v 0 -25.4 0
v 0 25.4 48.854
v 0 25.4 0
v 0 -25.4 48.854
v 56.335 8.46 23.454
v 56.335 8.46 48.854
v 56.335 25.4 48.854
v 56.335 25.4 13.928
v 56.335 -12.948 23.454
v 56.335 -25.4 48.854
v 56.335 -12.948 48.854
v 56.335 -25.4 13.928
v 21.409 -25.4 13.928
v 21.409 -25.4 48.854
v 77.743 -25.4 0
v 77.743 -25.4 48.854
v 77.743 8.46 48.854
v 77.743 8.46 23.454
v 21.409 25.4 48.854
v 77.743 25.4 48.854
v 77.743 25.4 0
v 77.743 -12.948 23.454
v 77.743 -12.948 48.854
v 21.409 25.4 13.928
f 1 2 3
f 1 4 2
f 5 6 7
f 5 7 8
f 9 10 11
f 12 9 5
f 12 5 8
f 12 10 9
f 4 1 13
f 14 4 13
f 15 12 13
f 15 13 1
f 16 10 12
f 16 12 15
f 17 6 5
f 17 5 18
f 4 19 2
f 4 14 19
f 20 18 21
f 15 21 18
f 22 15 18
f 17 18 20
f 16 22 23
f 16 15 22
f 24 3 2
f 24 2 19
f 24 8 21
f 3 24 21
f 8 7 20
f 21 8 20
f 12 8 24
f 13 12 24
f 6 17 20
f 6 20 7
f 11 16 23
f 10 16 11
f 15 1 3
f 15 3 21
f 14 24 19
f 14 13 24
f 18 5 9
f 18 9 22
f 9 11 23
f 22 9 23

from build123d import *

# Parameters (mm, degrees)
F1_DEPTH      = 25.4
F1_DEPTH_BACK = 25.4
F2_W          = 21.4085327461
F2_H          = 21.4085327461
F3_DEPTH      = 25.4


with BuildPart() as f1:
    # F0 (on Front) → F1 (new body, two sides)
    with BuildSketch(Plane.XZ) as f1_sk:
        Polygon((0, 48.854034394), (0, 0), (77.7433076873, 0), (77.7433076873, 48.854034394), (56.3347749412, 48.854034394), (56.3347749412, 13.927792199), (21.4085327461, 13.927792199), (21.4085327461, 48.854034394), align=None)
    extrude(amount=F1_DEPTH)
    extrude(f1_sk.sketch, amount=-F1_DEPTH_BACK)

    # F2 (on face) → F3 (cut)
    with BuildSketch(Plane.XY.offset(48.854034394)):
        with Locations((67.0390413143, -2.2439309396)):
            Rectangle(F2_W, F2_H)
    extrude(amount=-F3_DEPTH, mode=Mode.SUBTRACT)


solid = f1.part
